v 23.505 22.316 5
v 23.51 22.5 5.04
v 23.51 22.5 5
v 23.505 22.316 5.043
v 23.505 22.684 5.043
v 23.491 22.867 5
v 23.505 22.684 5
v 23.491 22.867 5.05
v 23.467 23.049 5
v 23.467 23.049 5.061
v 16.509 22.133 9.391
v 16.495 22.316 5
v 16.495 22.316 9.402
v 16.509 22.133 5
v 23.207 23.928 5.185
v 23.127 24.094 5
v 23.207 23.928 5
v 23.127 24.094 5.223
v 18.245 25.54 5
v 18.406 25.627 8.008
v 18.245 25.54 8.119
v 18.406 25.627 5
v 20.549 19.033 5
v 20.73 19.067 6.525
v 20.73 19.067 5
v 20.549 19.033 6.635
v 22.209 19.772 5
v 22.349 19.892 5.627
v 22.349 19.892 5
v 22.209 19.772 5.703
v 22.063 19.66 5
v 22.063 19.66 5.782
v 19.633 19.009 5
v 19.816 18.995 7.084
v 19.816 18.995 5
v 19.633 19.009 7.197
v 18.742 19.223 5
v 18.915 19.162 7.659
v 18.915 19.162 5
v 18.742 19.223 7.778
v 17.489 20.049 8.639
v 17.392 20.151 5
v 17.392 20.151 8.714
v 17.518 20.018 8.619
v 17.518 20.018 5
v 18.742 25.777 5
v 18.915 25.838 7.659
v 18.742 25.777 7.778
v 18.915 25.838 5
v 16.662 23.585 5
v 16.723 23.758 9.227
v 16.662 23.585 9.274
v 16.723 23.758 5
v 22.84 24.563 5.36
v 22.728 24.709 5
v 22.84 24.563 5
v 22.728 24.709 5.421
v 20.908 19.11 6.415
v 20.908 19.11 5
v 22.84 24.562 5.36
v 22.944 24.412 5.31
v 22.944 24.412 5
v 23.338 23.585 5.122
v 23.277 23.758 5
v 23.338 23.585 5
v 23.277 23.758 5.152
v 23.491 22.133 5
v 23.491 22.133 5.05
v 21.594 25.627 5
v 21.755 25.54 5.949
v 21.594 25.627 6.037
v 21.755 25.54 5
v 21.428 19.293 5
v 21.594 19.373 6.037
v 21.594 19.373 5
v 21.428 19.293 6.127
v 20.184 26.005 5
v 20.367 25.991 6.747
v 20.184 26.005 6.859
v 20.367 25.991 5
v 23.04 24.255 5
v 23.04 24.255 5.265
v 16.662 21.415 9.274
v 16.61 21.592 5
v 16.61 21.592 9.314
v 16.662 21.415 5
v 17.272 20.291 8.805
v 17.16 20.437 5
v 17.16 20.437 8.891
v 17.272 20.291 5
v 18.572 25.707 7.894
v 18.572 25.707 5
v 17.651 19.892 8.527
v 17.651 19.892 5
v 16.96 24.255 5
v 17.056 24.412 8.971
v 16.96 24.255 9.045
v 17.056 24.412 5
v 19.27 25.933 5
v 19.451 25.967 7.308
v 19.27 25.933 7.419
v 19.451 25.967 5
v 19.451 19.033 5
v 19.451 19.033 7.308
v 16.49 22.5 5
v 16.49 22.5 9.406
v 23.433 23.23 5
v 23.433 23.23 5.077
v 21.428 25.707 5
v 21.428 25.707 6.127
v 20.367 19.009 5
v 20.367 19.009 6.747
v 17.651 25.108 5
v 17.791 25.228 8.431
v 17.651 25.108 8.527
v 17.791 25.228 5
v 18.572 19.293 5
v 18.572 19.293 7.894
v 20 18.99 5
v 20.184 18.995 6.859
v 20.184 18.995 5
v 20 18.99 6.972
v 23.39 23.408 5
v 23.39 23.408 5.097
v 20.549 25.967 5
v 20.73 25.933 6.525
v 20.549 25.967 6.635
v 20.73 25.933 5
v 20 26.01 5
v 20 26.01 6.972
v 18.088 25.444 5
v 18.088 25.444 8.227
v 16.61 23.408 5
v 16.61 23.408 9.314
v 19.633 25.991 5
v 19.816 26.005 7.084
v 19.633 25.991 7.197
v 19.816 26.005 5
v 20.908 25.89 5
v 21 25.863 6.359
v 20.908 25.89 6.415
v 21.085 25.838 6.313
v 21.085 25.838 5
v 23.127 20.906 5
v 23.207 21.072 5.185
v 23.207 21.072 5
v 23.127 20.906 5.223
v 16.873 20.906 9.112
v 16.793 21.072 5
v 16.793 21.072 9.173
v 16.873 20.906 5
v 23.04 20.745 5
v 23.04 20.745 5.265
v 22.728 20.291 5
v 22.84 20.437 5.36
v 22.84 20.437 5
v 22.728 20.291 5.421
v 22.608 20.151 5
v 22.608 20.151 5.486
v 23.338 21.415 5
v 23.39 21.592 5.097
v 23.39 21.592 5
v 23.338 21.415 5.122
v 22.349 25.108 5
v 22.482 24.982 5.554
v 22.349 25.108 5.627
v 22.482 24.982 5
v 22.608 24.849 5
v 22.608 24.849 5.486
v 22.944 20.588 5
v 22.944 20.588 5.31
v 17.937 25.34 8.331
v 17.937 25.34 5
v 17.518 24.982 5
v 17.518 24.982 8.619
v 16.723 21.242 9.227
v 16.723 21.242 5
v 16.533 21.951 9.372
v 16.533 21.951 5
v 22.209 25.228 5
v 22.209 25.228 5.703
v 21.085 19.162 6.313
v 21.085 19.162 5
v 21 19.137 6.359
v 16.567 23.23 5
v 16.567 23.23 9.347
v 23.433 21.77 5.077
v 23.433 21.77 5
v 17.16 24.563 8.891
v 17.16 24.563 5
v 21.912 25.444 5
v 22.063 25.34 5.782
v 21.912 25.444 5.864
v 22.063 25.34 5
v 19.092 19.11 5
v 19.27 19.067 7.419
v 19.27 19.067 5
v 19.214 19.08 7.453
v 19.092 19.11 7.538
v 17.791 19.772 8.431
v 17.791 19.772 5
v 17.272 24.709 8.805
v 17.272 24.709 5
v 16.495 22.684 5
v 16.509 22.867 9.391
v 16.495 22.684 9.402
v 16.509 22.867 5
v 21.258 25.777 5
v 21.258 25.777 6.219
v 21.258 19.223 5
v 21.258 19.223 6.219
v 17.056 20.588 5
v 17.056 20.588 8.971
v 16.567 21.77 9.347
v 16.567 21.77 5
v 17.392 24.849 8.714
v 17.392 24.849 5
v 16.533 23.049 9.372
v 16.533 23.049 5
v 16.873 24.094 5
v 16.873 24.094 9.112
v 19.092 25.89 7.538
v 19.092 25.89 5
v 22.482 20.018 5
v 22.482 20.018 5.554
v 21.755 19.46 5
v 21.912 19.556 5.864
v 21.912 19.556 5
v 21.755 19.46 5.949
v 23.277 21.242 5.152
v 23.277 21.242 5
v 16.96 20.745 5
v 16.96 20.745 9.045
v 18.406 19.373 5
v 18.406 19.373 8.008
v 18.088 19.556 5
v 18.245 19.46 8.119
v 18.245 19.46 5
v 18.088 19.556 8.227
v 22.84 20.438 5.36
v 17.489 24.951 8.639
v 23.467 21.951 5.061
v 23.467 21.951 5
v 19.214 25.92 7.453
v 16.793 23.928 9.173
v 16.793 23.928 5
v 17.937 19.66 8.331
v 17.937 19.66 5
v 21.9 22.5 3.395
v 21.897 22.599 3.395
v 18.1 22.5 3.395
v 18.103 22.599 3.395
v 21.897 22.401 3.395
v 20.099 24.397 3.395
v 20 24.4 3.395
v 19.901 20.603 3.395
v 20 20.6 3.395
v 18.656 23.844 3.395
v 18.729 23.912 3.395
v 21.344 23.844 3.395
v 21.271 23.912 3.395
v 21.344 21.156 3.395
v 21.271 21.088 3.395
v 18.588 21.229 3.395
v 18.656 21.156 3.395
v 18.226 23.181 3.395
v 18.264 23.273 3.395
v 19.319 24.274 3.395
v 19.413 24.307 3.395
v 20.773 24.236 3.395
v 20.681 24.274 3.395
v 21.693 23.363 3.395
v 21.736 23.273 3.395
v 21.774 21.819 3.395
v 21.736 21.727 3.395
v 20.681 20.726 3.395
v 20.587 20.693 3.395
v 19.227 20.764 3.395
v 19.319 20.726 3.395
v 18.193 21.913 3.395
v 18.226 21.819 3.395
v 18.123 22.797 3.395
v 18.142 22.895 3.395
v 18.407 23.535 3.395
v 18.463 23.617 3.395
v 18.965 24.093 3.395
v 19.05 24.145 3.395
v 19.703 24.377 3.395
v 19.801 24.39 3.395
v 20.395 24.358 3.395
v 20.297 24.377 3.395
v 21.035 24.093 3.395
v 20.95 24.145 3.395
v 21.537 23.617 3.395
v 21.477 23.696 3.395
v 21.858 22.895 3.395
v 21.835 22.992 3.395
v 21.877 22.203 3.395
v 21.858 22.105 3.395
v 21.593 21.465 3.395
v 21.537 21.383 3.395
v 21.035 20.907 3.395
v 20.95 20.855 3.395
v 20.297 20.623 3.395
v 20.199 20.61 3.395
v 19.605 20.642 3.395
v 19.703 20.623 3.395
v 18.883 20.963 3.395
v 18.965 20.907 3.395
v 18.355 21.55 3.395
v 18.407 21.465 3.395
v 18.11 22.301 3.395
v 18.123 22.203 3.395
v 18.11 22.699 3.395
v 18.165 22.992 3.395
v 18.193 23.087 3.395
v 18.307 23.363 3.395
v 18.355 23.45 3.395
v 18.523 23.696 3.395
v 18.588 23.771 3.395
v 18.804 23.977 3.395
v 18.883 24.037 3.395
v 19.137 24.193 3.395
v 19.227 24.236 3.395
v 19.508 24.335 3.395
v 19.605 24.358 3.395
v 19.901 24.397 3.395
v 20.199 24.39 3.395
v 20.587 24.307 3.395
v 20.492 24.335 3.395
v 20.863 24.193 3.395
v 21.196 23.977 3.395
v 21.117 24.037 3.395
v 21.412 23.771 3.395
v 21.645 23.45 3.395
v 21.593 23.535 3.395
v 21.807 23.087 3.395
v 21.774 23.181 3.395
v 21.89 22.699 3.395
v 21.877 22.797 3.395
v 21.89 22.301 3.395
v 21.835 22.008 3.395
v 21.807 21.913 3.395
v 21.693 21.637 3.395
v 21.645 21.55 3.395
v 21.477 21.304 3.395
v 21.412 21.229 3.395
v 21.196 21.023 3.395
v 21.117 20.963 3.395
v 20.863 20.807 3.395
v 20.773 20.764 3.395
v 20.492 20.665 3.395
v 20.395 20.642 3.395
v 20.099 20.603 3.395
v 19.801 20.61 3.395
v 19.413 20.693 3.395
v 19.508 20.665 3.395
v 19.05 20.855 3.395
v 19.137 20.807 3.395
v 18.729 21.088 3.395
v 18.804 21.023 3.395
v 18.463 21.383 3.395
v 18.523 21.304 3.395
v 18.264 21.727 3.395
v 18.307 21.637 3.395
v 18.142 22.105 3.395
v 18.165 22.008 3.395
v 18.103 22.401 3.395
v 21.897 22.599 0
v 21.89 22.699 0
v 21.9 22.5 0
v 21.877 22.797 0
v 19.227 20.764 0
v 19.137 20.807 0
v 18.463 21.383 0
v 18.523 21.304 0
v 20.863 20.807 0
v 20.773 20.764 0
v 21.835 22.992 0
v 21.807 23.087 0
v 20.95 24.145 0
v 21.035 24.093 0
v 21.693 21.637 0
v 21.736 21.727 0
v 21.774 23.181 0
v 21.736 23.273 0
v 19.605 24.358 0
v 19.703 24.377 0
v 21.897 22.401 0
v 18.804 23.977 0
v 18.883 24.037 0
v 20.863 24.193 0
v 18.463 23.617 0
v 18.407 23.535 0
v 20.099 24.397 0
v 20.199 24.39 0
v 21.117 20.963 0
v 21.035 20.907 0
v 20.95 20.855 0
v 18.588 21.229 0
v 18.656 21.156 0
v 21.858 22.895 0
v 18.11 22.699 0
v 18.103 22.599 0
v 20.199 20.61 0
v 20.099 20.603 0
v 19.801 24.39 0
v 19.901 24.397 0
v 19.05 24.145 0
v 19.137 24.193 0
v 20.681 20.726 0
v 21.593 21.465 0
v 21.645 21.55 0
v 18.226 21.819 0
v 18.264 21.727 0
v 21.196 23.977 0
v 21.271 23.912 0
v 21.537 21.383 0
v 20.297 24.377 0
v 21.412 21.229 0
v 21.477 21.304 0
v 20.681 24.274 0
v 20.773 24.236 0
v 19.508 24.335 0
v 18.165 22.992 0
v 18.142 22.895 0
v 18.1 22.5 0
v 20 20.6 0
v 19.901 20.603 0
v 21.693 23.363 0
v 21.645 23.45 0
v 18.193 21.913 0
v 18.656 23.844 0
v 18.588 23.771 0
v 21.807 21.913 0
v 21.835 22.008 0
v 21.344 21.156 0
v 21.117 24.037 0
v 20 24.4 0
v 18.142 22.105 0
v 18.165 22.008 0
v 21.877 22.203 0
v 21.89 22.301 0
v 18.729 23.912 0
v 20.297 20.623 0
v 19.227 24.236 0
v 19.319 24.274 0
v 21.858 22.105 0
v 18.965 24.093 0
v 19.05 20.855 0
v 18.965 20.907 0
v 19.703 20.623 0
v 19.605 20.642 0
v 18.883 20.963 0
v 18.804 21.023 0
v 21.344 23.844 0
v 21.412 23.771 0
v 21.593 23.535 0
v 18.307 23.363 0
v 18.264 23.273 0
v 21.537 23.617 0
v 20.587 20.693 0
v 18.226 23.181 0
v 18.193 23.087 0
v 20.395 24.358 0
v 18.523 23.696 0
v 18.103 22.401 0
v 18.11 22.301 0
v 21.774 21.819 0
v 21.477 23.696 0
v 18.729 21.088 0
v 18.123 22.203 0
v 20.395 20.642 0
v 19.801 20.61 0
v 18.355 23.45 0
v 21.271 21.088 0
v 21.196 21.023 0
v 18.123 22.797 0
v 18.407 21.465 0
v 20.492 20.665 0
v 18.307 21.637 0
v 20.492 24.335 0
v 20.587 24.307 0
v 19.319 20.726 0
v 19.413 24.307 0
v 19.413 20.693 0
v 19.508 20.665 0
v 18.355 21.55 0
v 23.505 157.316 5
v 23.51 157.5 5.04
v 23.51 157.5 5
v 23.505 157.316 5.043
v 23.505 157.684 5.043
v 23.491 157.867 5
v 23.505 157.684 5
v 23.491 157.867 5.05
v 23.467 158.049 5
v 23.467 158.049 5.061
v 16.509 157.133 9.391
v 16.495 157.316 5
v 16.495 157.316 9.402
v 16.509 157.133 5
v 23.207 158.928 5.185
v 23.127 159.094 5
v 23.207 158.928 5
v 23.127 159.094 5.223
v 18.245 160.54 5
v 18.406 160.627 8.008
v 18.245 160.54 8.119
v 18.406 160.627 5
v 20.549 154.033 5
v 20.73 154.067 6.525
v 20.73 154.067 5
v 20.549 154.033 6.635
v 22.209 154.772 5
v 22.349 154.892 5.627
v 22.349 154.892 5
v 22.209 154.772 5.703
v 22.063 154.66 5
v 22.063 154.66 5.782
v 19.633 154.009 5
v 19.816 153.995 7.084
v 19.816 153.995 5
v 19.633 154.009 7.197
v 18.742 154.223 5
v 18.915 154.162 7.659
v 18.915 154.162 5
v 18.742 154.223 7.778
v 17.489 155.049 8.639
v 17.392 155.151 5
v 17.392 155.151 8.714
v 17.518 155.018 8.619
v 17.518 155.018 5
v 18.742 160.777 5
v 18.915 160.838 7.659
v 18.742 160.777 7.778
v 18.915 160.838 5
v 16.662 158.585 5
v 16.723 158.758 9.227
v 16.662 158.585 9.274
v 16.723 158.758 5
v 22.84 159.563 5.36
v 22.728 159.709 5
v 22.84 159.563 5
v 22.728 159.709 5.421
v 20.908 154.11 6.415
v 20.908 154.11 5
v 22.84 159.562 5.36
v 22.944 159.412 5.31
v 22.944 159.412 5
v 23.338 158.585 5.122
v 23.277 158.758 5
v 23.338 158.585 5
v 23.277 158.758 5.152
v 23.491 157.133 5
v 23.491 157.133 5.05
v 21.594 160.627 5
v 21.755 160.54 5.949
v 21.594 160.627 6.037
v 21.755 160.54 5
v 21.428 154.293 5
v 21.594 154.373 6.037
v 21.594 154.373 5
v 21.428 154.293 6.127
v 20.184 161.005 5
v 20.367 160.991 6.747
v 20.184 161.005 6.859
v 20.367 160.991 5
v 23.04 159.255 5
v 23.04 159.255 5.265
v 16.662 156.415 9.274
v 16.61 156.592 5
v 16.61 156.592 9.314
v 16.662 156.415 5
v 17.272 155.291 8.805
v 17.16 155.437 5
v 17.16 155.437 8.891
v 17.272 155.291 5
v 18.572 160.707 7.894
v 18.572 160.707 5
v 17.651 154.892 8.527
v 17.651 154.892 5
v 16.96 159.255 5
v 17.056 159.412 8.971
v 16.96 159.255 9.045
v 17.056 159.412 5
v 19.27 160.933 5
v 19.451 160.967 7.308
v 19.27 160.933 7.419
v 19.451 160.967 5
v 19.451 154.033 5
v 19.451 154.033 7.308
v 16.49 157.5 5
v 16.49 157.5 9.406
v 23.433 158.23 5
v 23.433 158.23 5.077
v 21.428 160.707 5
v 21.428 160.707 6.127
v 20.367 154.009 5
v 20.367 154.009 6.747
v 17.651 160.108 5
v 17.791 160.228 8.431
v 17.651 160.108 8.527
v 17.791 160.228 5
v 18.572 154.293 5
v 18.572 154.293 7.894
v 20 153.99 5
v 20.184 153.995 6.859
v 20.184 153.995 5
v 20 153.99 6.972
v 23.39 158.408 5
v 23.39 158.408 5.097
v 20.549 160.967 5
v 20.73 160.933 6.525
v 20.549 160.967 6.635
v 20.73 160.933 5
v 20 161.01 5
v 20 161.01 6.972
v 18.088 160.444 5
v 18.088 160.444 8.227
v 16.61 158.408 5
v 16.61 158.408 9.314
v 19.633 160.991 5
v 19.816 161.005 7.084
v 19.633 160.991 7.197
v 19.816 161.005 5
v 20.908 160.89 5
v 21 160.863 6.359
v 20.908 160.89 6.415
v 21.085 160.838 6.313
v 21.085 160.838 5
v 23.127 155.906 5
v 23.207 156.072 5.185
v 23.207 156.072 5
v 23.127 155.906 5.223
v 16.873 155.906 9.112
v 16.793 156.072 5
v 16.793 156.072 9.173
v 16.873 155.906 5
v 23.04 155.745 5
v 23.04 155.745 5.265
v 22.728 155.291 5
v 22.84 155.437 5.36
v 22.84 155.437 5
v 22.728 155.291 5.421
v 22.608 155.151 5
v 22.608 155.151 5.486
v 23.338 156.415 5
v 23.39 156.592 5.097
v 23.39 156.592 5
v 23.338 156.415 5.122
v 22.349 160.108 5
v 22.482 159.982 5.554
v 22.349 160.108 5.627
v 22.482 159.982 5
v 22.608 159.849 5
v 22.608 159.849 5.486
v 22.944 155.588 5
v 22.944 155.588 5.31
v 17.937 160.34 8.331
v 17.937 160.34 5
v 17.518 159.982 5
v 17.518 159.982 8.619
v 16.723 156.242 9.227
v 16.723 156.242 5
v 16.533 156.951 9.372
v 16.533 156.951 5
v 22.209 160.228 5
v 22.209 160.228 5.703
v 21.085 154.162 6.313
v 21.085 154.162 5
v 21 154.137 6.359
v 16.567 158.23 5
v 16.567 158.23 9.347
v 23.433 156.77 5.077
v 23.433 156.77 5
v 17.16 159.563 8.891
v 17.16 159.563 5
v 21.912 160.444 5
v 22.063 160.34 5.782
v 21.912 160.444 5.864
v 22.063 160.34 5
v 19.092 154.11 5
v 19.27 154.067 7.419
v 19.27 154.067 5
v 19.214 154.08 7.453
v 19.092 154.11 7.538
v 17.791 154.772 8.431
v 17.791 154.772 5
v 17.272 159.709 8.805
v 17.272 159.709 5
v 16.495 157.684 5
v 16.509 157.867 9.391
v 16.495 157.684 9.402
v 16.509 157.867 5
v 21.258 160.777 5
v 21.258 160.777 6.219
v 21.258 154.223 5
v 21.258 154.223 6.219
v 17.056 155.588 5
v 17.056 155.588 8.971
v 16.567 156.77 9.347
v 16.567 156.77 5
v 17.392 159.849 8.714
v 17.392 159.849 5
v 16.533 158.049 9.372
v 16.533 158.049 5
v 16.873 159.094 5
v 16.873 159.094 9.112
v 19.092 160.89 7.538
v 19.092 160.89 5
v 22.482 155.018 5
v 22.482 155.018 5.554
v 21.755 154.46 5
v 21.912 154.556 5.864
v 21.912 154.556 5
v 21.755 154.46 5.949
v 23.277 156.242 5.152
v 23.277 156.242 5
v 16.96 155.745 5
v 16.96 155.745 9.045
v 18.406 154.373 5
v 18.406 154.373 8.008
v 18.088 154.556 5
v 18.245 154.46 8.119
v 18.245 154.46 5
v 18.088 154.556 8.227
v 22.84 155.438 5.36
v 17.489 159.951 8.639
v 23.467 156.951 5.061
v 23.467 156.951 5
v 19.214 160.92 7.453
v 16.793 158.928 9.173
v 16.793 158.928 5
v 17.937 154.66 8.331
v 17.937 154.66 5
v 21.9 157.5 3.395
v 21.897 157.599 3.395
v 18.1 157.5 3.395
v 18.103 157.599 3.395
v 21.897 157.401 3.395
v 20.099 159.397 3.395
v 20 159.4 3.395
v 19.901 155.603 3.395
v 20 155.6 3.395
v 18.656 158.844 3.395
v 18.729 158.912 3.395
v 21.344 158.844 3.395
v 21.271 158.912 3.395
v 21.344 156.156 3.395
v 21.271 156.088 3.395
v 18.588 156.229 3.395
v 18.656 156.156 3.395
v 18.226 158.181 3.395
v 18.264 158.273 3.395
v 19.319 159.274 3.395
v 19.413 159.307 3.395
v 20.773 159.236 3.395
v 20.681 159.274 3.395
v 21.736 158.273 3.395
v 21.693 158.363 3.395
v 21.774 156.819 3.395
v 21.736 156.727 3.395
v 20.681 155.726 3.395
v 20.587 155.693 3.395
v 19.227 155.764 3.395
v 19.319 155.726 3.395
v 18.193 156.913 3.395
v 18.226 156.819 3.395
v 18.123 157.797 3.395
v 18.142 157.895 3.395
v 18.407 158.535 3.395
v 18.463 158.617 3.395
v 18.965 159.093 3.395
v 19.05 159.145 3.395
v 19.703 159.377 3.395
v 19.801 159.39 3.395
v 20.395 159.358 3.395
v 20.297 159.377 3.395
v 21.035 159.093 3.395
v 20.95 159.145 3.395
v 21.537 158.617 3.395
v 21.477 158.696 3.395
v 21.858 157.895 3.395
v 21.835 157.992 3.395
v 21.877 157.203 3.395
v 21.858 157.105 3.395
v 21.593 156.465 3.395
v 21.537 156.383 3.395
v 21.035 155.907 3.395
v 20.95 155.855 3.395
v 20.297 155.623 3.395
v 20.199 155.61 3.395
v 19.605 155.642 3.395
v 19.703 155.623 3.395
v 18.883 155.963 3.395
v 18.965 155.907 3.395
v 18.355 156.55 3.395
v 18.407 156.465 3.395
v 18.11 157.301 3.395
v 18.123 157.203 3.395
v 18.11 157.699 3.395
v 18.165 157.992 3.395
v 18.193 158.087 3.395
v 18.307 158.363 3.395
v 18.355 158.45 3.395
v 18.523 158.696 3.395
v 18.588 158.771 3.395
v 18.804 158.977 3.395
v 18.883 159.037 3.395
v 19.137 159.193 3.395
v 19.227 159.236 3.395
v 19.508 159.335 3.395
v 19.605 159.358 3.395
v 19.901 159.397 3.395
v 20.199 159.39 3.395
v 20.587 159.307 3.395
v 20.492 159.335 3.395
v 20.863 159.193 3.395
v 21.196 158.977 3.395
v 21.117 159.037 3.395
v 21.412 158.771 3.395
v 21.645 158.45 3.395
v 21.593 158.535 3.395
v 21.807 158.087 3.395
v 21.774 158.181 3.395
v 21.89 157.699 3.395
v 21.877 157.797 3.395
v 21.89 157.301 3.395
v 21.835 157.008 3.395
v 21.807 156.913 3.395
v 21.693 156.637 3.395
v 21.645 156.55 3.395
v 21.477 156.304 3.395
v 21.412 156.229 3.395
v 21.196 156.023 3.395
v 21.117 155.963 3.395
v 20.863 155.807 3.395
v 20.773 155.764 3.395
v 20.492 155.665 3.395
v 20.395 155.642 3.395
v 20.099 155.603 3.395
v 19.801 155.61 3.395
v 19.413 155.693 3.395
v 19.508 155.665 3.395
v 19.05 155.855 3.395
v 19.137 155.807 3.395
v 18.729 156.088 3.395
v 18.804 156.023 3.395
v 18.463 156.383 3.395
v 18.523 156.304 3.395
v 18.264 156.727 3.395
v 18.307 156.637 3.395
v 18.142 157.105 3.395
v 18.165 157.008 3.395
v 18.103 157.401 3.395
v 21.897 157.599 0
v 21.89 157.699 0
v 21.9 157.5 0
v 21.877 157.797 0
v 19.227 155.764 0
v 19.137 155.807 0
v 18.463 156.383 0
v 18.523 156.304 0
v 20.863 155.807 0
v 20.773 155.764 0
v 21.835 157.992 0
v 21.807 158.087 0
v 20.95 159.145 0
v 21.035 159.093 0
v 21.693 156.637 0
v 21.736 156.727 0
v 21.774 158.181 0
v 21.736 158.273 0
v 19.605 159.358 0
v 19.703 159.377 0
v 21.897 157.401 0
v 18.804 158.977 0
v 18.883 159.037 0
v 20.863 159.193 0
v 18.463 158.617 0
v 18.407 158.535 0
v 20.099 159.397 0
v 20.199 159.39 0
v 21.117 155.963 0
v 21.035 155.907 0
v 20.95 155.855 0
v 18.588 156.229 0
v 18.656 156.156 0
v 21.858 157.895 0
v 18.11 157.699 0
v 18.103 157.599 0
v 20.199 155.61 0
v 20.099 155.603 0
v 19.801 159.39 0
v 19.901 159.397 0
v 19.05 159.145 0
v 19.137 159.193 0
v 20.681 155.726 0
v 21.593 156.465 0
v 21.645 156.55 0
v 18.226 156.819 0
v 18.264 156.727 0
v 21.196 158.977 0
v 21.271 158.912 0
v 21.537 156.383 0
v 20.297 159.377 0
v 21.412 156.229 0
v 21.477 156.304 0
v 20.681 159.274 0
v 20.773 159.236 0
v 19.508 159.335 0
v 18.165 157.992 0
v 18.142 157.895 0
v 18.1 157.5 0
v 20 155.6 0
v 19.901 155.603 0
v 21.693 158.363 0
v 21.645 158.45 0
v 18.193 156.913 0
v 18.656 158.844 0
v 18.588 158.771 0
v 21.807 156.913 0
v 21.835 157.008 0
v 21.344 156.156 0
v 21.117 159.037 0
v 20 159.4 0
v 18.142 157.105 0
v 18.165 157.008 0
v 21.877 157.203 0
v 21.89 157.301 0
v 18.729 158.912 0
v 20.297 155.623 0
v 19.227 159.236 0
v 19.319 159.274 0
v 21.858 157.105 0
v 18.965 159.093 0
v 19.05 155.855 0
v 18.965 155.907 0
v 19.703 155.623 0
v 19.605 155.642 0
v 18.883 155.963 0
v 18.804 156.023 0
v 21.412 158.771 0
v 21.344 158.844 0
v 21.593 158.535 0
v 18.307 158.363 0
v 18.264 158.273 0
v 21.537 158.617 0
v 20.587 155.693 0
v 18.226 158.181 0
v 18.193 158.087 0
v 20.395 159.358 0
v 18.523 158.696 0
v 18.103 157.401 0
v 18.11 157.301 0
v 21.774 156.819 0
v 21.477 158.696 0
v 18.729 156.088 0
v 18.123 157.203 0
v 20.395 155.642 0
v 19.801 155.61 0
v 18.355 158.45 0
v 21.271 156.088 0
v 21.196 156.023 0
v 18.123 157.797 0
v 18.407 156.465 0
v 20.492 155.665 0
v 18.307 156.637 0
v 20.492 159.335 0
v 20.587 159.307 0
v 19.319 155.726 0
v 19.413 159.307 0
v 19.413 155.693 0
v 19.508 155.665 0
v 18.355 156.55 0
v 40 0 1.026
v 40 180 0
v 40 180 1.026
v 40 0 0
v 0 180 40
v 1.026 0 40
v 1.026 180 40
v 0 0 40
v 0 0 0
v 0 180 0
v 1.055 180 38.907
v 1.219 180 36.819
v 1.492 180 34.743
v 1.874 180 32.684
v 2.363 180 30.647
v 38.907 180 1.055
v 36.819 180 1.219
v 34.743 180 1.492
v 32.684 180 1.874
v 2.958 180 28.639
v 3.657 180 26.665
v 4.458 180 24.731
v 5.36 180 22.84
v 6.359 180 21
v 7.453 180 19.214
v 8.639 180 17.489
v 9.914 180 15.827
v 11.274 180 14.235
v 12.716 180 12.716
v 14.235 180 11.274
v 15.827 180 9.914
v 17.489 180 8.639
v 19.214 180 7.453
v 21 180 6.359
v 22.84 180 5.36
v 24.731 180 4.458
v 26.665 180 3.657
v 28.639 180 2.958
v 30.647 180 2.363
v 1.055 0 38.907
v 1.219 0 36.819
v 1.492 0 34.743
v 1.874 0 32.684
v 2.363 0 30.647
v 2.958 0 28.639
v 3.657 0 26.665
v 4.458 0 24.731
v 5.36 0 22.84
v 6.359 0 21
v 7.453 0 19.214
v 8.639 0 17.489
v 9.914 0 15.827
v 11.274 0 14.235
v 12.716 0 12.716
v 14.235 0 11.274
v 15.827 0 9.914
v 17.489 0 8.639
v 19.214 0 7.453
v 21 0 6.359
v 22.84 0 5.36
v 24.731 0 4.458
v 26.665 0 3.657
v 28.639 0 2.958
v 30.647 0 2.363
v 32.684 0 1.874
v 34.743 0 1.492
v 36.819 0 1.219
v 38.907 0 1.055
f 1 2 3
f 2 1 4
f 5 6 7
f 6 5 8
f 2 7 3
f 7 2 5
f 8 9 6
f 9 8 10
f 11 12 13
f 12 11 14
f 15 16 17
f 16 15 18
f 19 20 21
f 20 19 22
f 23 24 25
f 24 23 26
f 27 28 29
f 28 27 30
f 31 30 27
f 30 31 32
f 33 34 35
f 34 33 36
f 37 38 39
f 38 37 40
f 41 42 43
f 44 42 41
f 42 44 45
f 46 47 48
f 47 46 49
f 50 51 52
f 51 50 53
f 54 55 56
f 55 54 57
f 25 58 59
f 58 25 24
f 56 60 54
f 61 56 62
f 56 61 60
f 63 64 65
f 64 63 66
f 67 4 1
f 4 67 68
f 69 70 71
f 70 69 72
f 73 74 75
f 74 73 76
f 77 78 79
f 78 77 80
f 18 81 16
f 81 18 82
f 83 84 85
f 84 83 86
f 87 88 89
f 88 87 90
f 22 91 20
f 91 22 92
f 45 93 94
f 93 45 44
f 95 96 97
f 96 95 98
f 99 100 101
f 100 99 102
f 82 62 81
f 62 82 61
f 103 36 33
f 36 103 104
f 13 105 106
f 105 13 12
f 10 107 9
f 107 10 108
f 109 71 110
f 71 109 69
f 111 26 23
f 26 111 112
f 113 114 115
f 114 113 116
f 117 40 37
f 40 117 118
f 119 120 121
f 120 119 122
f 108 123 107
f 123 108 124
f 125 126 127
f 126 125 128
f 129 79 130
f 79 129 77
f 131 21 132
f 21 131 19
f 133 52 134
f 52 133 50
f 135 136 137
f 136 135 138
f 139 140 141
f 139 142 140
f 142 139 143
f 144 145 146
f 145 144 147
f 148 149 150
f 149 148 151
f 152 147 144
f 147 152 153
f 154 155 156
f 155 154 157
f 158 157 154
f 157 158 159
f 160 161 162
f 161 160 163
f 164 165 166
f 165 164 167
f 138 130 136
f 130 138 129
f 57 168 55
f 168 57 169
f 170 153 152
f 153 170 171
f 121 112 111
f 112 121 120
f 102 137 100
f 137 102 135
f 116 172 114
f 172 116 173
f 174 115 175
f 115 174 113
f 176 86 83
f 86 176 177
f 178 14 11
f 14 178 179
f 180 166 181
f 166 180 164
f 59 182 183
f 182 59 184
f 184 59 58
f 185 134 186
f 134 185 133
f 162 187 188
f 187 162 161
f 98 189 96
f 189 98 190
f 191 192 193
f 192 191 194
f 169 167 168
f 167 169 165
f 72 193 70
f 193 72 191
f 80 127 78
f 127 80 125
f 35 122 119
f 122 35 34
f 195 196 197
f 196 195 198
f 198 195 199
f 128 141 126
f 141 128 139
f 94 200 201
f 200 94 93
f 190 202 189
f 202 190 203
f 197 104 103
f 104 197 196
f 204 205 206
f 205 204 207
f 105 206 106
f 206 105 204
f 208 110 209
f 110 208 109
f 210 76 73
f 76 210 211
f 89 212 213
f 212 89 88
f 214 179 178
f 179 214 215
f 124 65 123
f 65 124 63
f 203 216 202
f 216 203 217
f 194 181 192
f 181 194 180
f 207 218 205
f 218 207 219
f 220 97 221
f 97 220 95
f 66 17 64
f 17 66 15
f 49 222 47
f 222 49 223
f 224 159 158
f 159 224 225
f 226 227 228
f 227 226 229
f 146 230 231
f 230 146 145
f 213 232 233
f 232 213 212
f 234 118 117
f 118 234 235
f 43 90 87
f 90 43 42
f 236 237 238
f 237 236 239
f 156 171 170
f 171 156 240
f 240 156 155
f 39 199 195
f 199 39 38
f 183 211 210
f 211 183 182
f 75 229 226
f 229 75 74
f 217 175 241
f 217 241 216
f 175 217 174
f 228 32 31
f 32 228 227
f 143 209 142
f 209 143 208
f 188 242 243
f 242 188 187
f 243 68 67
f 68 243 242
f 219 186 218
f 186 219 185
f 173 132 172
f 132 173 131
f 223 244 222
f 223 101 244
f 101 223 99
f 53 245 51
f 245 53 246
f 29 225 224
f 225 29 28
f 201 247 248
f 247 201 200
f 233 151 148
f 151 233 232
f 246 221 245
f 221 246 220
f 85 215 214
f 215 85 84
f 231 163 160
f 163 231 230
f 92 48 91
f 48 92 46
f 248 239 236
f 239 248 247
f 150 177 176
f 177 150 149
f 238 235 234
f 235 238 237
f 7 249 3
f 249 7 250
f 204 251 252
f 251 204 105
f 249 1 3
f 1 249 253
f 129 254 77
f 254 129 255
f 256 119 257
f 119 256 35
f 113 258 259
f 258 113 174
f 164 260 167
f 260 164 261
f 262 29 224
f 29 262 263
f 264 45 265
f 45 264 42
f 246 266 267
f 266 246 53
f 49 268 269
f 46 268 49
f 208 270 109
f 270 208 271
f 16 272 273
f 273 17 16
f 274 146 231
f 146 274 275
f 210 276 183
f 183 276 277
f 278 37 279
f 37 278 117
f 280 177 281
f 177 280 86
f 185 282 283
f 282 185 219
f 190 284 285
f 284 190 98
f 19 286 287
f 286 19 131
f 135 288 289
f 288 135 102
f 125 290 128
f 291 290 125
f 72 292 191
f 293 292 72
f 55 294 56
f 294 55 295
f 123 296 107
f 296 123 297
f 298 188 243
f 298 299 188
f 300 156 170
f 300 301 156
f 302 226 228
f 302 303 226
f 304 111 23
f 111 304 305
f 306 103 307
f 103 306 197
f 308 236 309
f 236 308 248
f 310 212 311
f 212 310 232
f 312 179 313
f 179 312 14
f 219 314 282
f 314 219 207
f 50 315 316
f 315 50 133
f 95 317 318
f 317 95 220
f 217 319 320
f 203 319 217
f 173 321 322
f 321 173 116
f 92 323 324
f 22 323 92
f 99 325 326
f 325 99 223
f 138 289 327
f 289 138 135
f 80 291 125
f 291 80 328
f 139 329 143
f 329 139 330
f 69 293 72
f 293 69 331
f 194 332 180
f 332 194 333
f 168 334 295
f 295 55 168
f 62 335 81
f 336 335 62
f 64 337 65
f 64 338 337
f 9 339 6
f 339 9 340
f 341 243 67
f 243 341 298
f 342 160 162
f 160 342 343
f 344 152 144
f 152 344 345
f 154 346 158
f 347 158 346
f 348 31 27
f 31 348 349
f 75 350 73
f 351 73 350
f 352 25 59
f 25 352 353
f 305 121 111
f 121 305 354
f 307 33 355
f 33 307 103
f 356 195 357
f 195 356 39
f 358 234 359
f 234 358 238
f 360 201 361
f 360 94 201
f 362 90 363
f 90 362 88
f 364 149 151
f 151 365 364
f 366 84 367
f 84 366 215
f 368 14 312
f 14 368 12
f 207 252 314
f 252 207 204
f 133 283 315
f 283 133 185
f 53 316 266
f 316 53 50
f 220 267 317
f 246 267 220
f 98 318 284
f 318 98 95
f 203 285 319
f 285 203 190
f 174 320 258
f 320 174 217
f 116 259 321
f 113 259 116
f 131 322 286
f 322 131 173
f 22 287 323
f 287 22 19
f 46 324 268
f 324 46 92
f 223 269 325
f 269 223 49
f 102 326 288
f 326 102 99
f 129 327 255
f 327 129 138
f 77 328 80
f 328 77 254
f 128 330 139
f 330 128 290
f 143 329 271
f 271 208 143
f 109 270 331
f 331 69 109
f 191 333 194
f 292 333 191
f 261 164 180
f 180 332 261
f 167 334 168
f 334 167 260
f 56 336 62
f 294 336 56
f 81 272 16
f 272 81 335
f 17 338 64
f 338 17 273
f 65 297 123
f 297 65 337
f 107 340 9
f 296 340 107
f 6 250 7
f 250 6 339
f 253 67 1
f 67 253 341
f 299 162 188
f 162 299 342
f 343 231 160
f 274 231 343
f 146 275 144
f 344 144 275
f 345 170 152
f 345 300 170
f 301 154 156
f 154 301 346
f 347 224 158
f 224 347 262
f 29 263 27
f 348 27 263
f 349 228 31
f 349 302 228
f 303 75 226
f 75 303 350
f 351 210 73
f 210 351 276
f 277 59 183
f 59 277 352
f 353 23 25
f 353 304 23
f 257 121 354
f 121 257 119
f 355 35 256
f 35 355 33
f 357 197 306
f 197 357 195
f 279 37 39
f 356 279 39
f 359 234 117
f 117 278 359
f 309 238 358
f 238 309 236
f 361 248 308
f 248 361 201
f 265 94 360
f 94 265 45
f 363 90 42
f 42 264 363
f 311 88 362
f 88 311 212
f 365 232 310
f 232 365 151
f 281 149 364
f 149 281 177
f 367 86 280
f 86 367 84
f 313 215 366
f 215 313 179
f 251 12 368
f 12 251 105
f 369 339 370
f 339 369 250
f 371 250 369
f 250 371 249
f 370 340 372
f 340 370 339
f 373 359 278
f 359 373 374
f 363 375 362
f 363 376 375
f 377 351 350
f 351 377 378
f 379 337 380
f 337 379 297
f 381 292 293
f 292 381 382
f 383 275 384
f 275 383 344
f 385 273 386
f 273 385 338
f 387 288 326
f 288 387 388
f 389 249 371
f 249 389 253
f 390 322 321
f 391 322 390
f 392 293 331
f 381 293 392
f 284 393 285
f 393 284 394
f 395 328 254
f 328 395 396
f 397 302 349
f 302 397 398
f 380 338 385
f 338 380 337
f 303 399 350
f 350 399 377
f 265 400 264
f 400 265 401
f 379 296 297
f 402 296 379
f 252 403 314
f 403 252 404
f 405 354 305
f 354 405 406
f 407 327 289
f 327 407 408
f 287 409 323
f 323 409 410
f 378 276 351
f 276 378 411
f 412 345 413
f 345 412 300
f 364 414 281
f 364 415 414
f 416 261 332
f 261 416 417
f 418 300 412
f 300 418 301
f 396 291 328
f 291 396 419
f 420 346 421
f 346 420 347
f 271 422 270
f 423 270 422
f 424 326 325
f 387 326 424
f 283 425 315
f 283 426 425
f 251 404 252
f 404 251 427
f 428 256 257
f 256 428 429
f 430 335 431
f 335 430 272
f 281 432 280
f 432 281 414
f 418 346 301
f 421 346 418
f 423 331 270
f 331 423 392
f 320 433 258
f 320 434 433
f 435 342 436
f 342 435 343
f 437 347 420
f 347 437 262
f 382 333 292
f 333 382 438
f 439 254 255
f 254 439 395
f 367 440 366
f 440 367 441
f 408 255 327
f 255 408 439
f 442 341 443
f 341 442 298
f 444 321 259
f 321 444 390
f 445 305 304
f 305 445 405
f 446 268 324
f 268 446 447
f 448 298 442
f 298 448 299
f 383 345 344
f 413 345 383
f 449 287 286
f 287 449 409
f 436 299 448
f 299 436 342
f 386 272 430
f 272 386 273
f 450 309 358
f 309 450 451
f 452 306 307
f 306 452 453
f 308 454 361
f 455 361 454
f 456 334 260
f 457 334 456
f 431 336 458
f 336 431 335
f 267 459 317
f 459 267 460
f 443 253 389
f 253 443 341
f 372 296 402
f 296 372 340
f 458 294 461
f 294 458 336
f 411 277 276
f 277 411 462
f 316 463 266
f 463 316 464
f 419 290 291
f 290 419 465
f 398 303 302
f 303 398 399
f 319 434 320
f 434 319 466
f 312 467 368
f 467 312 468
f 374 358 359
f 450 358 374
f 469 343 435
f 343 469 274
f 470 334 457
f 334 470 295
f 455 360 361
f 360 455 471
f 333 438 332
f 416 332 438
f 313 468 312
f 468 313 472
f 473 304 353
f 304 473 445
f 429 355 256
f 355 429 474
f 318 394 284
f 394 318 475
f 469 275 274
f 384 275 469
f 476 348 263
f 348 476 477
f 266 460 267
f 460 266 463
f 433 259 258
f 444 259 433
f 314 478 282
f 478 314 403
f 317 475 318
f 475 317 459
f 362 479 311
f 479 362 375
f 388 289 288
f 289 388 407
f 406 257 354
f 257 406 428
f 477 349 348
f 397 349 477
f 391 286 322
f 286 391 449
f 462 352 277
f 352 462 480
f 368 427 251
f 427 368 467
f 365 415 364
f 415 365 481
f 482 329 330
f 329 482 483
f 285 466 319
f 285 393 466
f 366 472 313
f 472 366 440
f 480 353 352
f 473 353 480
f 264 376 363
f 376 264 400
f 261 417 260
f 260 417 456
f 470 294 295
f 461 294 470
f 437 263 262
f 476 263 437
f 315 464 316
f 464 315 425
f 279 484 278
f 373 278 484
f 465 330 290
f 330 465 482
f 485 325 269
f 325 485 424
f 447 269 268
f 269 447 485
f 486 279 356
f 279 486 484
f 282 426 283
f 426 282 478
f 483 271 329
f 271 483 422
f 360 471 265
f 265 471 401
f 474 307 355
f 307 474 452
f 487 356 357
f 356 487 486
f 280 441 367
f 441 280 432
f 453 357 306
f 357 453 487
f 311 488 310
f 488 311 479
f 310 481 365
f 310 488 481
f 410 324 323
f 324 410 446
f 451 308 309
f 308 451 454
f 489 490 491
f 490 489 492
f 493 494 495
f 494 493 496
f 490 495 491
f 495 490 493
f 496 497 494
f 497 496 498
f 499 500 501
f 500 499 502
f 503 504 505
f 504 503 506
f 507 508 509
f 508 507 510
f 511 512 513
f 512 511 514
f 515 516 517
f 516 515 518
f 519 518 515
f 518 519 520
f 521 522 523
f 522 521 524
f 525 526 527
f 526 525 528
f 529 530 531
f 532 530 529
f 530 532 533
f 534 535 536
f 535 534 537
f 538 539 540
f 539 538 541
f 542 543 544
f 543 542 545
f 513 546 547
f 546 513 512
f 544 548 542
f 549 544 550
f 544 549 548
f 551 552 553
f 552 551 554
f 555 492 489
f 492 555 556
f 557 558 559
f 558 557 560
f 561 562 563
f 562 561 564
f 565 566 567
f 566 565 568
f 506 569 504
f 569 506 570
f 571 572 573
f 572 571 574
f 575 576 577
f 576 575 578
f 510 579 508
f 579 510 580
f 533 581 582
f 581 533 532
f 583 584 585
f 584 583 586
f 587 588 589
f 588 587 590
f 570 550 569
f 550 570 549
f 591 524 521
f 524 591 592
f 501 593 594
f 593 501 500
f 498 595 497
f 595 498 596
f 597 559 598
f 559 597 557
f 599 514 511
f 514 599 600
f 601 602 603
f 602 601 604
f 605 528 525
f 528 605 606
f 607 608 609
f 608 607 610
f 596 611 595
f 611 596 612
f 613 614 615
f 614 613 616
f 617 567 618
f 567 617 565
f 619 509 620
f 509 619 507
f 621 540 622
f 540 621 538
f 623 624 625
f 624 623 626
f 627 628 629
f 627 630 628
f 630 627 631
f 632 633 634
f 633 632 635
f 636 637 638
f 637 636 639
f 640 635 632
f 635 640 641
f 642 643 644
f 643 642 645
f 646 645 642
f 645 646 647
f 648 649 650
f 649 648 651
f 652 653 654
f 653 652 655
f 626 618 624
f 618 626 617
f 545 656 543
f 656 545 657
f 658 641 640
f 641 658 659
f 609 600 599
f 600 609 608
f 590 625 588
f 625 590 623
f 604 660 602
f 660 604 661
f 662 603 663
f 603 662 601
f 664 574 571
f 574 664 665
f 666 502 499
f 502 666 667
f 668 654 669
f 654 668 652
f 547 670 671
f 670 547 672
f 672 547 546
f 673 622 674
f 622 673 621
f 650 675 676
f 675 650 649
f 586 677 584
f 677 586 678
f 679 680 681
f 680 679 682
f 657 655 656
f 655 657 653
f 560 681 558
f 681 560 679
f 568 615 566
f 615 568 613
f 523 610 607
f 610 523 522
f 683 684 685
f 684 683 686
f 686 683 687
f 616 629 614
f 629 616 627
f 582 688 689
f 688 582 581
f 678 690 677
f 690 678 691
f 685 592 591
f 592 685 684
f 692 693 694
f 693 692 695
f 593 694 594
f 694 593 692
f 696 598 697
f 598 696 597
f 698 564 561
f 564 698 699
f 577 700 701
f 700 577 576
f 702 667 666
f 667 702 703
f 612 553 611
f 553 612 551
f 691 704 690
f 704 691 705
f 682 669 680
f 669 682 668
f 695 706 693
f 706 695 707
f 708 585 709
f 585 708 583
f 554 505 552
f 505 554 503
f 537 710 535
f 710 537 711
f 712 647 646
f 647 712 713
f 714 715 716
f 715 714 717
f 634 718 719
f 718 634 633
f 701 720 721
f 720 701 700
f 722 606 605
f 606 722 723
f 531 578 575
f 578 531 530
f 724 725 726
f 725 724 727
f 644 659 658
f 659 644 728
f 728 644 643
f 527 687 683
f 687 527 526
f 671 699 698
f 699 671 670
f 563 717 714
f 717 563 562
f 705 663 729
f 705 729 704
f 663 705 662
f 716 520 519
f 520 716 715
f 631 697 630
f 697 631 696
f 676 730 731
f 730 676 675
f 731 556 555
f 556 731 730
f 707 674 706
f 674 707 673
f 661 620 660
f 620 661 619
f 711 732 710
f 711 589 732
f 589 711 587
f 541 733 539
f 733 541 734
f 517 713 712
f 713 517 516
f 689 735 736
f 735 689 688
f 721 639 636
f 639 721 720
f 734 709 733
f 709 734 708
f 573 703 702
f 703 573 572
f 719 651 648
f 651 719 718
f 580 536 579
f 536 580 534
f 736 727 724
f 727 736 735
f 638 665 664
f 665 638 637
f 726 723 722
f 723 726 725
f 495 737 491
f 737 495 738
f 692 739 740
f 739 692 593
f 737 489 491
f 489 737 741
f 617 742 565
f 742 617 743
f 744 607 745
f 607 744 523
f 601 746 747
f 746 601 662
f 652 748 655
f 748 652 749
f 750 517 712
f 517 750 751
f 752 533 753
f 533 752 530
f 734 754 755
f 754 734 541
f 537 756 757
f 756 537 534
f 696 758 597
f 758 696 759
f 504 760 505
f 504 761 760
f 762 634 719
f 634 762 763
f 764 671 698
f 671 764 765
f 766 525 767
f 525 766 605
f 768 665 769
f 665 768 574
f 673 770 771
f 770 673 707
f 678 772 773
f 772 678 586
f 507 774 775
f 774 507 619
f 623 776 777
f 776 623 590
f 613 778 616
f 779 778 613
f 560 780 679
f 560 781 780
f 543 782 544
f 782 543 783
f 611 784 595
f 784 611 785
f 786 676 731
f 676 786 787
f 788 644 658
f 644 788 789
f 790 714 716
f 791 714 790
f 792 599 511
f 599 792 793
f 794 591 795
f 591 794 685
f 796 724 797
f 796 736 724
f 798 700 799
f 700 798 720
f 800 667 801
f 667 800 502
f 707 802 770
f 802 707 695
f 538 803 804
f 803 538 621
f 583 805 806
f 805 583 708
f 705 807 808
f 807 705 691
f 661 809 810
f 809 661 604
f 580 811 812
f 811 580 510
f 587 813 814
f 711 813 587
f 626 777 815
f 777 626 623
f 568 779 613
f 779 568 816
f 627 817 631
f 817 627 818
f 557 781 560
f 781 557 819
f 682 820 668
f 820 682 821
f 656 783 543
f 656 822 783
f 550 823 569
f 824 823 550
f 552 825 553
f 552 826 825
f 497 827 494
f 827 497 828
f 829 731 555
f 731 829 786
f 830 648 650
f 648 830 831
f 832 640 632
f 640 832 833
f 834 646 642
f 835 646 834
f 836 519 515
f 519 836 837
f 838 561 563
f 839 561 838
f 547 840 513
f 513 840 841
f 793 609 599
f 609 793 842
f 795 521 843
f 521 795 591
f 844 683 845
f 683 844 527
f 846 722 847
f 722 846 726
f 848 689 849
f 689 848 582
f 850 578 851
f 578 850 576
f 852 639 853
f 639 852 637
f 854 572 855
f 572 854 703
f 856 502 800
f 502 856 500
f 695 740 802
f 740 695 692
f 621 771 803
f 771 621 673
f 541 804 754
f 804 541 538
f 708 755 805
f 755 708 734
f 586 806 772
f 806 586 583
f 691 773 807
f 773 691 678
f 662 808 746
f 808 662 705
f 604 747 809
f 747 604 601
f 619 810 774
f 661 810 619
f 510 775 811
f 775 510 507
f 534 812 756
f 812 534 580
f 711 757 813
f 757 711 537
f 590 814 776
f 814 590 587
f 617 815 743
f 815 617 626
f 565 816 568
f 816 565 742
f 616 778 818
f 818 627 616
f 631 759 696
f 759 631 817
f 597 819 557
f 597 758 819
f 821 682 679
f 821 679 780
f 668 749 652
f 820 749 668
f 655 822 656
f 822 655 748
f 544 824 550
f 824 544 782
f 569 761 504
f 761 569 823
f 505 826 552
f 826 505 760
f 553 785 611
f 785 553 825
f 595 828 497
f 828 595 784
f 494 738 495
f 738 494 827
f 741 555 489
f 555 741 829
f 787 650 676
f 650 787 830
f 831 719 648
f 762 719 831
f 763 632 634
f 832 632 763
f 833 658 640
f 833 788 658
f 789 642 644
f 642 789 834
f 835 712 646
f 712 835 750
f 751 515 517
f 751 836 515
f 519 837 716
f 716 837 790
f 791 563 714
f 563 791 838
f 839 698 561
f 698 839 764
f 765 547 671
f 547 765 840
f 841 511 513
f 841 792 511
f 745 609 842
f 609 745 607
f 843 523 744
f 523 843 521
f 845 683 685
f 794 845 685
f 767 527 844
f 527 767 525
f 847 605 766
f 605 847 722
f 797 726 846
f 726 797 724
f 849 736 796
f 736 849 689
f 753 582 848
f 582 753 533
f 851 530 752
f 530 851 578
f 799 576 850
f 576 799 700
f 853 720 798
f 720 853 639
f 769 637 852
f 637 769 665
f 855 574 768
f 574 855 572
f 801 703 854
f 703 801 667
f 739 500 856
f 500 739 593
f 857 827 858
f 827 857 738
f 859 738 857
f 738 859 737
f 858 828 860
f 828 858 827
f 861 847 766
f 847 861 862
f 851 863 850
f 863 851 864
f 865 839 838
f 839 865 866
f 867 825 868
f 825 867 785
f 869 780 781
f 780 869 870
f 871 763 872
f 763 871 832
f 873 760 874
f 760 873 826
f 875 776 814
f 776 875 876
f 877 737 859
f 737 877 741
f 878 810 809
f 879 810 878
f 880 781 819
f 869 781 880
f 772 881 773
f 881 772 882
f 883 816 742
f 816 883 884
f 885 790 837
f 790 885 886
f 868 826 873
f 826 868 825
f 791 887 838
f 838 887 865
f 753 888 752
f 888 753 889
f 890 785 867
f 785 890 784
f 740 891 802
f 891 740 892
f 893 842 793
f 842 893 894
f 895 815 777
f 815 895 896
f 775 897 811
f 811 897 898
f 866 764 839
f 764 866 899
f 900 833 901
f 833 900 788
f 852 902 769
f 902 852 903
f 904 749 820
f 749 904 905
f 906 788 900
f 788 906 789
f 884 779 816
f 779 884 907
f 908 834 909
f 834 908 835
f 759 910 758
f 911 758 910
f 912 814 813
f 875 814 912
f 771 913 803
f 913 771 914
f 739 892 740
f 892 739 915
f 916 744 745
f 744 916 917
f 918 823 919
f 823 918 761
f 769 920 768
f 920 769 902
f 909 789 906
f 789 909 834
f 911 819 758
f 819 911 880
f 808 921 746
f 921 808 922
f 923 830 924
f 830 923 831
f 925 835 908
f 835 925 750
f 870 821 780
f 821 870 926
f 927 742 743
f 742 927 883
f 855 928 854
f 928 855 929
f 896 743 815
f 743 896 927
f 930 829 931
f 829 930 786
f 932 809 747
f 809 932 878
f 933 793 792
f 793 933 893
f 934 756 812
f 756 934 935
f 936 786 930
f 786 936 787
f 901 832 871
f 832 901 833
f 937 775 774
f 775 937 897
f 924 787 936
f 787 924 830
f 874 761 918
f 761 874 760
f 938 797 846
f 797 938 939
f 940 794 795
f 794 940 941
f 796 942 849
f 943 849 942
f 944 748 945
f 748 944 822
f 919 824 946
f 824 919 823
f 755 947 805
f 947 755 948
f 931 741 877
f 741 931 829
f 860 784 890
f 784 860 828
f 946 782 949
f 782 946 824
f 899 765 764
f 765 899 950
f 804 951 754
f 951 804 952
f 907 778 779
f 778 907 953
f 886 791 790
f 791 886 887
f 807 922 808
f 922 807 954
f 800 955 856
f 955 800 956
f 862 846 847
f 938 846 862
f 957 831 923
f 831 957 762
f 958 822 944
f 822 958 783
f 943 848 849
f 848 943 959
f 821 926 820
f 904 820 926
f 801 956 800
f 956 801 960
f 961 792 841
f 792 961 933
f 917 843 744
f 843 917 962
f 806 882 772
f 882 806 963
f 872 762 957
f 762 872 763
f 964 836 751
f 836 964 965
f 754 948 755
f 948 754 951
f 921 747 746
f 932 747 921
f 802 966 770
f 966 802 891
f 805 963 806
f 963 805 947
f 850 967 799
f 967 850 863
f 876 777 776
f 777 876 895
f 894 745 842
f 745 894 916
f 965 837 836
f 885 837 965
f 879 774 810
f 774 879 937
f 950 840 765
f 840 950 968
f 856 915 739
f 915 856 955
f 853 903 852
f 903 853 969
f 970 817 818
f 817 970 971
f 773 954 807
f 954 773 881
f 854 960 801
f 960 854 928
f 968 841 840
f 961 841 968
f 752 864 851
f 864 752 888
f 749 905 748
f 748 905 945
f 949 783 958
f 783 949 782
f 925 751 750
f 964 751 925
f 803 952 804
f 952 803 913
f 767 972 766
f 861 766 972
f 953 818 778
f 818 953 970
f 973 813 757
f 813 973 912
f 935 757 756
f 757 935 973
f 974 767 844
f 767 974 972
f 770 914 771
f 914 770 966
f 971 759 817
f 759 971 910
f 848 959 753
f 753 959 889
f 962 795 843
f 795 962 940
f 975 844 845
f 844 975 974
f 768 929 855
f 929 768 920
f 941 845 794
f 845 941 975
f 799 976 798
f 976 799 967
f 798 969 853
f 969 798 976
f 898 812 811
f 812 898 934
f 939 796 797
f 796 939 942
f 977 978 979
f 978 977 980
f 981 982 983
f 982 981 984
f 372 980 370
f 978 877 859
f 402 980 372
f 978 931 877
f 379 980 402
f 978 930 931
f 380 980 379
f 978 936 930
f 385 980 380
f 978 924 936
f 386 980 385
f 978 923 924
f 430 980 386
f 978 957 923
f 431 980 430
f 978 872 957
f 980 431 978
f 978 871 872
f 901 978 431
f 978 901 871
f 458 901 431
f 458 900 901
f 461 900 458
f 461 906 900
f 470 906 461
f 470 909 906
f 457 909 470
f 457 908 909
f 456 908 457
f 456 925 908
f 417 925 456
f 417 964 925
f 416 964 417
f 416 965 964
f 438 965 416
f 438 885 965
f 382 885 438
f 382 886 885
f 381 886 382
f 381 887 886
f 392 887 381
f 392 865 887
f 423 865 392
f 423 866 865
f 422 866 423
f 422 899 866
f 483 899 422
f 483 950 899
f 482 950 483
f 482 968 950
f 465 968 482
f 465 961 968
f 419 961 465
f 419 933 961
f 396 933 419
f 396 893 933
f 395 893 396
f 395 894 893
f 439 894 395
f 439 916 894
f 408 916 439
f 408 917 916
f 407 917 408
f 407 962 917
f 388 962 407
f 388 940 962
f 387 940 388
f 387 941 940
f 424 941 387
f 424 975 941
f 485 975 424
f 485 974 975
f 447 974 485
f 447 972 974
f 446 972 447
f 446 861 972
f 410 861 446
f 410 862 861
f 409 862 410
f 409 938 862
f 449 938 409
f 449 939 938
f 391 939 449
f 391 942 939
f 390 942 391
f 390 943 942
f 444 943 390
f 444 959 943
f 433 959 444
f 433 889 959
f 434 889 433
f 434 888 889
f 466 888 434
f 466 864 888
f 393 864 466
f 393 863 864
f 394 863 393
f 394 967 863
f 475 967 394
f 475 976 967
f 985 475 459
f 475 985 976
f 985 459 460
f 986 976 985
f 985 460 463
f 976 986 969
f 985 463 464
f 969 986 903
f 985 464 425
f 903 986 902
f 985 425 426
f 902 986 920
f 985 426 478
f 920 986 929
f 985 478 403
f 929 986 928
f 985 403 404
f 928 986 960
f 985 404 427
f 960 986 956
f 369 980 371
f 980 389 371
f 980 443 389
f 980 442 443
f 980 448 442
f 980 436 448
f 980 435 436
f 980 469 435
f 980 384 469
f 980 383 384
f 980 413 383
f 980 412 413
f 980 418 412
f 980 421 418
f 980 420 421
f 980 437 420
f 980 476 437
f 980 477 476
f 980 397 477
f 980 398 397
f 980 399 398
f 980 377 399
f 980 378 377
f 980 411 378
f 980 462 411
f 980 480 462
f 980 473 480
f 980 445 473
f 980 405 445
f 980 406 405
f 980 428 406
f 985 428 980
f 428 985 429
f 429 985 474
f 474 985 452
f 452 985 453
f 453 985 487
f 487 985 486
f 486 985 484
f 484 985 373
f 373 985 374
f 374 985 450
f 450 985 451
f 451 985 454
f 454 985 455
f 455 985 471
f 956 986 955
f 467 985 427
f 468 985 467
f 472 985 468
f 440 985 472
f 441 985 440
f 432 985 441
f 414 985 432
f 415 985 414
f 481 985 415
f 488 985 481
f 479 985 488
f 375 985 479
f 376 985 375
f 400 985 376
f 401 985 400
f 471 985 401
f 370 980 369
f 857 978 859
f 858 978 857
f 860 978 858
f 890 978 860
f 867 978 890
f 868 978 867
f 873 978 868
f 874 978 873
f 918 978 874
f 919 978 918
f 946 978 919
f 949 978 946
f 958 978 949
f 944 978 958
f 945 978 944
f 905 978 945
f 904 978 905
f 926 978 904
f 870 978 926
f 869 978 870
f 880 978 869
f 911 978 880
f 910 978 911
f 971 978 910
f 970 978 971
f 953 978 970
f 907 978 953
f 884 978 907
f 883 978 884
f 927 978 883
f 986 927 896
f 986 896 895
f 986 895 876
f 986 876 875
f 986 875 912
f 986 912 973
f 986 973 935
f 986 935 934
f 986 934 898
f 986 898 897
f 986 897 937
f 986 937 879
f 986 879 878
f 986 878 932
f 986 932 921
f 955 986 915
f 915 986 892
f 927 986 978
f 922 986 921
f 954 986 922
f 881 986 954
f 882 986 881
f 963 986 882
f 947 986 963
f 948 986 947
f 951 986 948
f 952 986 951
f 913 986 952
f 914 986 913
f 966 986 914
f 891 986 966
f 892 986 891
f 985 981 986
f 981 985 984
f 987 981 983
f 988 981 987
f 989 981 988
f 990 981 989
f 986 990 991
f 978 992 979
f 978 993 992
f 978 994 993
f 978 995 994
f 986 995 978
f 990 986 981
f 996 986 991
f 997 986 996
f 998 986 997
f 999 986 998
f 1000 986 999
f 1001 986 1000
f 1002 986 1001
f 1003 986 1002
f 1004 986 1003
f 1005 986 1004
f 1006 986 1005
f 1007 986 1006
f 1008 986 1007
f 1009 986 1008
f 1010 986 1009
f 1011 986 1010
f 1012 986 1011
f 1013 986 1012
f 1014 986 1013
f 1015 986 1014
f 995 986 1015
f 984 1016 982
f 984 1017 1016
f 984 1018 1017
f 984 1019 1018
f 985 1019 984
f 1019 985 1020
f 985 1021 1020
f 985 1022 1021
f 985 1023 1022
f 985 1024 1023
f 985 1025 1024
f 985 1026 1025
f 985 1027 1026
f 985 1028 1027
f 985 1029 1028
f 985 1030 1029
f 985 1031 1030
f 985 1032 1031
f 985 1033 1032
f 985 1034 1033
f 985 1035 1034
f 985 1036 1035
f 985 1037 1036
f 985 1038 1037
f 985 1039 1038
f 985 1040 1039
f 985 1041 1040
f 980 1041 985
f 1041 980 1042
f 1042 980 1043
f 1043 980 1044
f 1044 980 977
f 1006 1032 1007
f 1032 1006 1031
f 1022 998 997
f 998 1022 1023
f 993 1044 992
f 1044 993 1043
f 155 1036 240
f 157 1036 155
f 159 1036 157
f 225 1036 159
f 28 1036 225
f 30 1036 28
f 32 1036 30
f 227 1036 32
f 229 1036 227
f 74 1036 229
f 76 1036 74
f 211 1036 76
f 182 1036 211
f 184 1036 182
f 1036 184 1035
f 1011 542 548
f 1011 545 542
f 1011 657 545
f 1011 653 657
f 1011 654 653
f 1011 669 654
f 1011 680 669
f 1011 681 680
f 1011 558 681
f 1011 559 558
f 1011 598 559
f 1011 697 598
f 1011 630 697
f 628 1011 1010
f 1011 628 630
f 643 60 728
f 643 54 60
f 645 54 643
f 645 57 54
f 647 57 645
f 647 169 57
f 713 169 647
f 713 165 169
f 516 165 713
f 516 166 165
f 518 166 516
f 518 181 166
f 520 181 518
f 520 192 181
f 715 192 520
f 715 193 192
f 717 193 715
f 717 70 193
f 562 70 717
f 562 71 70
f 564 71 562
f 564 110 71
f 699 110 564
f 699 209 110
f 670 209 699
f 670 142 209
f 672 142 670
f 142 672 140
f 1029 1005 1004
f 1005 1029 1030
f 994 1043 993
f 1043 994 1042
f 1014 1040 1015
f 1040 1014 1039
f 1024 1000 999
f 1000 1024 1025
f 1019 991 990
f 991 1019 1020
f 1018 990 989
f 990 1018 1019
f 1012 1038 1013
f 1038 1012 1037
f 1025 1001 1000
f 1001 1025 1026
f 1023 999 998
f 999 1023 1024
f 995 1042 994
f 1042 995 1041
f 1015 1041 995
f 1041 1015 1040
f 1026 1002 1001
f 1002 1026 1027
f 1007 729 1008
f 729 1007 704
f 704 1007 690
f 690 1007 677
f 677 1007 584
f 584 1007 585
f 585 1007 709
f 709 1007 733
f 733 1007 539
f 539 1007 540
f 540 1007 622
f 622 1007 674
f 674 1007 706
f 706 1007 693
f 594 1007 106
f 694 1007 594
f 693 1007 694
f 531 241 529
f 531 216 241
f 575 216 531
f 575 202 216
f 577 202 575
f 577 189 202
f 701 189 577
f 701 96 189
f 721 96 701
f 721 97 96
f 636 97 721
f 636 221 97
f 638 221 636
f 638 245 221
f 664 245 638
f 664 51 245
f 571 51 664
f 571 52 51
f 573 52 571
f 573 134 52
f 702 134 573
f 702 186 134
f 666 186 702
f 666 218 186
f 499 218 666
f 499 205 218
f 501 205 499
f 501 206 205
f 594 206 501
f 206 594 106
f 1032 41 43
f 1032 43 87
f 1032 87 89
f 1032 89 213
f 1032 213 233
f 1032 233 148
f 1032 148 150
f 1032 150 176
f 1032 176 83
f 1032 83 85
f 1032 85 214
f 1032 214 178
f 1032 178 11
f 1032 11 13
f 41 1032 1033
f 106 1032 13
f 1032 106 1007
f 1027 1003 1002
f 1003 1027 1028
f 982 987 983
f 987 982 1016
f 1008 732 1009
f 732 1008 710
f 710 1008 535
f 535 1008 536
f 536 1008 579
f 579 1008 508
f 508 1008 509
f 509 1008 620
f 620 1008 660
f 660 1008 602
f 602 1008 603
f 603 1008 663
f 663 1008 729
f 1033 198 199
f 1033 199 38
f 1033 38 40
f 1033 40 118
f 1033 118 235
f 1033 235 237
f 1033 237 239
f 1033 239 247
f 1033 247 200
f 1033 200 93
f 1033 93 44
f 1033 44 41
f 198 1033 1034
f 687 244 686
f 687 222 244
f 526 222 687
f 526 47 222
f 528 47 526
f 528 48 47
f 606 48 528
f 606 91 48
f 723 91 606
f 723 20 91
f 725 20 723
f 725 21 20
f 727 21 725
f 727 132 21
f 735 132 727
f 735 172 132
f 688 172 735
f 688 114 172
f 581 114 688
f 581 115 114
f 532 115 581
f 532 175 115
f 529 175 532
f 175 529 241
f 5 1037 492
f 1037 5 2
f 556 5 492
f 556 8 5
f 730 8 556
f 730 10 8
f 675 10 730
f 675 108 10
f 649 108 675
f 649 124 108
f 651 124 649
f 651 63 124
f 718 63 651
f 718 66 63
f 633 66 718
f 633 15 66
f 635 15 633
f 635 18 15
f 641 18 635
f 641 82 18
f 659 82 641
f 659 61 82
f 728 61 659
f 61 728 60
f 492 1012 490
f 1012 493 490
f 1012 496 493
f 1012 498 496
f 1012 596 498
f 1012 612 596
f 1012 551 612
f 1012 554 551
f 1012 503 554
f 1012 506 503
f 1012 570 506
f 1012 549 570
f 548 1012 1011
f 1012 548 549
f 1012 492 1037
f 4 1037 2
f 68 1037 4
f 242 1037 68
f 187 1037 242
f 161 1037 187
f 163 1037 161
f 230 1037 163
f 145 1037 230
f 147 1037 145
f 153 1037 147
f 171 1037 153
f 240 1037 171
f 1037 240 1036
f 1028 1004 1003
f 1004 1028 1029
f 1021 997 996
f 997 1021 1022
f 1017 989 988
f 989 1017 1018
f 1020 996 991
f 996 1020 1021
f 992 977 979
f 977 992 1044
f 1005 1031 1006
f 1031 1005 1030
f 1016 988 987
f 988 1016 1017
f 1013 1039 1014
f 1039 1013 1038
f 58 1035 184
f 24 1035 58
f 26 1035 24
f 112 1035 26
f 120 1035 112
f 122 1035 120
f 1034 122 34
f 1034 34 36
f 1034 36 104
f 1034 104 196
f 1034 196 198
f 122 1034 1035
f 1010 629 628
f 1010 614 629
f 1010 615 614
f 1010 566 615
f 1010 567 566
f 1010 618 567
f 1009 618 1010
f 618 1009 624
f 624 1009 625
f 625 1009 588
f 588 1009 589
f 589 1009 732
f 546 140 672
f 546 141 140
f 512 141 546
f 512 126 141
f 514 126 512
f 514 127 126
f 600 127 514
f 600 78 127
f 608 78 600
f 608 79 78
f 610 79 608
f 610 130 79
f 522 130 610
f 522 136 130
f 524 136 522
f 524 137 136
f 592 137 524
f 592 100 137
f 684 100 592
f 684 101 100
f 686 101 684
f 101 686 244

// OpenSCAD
// Shelf side bracket with 2 screws
// Feel free to adapt to size
// by Martin Korinek
// Oct. 2020

//Number of fragments, used for different styles, not used for screw holes
$fn = 120; //[4:45°,6:Asymmetrical-flat,8:Asymmetrical,10:Asymmetrical 3-faced,12:Symmetrical 3-faced,24:Stepped,120:Round,360:Round High Res]
//Height on wall, width under board, currently only square profile implemented
bracket_size = 40; // [10:100]
//Bracket width, tested with 180 mm length, longer might need additional screws
bracket_width = 180; // [50:300]
//Thinnest part, measured from a circle e.g. $fn120
bracket_thickness = 1; // [100]
//Inner hole diameter
screw_diameter = 3.8;
//Screw head diameter for flush countersunk screw
head_diameter = 7;

difference()
{
    cube([bracket_size,bracket_width,bracket_size]);
    translate([bracket_size+bracket_thickness,0,bracket_size+bracket_thickness]) 
        rotate([-90,0,0]) 
            cylinder(h=bracket_width,r=bracket_size);
    //screw hole #1
    translate([bracket_size/2,bracket_width/8,2]) screw_hole(screw_diameter,head_diameter);
    //screw hole #2
    translate([bracket_size/2,bracket_width-bracket_width/8,2]) screw_hole(screw_diameter,head_diameter);
}

module screw_hole(screw_diameter = 3.8,head_diameter = 7)
{   
    $fn =120; 
    
    translate([0,0,head_diameter/2-0.5])
        cylinder(h=100, d1=head_diameter+0.02, d2=head_diameter+0.02);
    translate([0,0,-0.5])cylinder(h=head_diameter/2, d1=0, d2=head_diameter+0.02);
    translate([0,0,-18])cylinder(h=20, d=screw_diameter);
}
